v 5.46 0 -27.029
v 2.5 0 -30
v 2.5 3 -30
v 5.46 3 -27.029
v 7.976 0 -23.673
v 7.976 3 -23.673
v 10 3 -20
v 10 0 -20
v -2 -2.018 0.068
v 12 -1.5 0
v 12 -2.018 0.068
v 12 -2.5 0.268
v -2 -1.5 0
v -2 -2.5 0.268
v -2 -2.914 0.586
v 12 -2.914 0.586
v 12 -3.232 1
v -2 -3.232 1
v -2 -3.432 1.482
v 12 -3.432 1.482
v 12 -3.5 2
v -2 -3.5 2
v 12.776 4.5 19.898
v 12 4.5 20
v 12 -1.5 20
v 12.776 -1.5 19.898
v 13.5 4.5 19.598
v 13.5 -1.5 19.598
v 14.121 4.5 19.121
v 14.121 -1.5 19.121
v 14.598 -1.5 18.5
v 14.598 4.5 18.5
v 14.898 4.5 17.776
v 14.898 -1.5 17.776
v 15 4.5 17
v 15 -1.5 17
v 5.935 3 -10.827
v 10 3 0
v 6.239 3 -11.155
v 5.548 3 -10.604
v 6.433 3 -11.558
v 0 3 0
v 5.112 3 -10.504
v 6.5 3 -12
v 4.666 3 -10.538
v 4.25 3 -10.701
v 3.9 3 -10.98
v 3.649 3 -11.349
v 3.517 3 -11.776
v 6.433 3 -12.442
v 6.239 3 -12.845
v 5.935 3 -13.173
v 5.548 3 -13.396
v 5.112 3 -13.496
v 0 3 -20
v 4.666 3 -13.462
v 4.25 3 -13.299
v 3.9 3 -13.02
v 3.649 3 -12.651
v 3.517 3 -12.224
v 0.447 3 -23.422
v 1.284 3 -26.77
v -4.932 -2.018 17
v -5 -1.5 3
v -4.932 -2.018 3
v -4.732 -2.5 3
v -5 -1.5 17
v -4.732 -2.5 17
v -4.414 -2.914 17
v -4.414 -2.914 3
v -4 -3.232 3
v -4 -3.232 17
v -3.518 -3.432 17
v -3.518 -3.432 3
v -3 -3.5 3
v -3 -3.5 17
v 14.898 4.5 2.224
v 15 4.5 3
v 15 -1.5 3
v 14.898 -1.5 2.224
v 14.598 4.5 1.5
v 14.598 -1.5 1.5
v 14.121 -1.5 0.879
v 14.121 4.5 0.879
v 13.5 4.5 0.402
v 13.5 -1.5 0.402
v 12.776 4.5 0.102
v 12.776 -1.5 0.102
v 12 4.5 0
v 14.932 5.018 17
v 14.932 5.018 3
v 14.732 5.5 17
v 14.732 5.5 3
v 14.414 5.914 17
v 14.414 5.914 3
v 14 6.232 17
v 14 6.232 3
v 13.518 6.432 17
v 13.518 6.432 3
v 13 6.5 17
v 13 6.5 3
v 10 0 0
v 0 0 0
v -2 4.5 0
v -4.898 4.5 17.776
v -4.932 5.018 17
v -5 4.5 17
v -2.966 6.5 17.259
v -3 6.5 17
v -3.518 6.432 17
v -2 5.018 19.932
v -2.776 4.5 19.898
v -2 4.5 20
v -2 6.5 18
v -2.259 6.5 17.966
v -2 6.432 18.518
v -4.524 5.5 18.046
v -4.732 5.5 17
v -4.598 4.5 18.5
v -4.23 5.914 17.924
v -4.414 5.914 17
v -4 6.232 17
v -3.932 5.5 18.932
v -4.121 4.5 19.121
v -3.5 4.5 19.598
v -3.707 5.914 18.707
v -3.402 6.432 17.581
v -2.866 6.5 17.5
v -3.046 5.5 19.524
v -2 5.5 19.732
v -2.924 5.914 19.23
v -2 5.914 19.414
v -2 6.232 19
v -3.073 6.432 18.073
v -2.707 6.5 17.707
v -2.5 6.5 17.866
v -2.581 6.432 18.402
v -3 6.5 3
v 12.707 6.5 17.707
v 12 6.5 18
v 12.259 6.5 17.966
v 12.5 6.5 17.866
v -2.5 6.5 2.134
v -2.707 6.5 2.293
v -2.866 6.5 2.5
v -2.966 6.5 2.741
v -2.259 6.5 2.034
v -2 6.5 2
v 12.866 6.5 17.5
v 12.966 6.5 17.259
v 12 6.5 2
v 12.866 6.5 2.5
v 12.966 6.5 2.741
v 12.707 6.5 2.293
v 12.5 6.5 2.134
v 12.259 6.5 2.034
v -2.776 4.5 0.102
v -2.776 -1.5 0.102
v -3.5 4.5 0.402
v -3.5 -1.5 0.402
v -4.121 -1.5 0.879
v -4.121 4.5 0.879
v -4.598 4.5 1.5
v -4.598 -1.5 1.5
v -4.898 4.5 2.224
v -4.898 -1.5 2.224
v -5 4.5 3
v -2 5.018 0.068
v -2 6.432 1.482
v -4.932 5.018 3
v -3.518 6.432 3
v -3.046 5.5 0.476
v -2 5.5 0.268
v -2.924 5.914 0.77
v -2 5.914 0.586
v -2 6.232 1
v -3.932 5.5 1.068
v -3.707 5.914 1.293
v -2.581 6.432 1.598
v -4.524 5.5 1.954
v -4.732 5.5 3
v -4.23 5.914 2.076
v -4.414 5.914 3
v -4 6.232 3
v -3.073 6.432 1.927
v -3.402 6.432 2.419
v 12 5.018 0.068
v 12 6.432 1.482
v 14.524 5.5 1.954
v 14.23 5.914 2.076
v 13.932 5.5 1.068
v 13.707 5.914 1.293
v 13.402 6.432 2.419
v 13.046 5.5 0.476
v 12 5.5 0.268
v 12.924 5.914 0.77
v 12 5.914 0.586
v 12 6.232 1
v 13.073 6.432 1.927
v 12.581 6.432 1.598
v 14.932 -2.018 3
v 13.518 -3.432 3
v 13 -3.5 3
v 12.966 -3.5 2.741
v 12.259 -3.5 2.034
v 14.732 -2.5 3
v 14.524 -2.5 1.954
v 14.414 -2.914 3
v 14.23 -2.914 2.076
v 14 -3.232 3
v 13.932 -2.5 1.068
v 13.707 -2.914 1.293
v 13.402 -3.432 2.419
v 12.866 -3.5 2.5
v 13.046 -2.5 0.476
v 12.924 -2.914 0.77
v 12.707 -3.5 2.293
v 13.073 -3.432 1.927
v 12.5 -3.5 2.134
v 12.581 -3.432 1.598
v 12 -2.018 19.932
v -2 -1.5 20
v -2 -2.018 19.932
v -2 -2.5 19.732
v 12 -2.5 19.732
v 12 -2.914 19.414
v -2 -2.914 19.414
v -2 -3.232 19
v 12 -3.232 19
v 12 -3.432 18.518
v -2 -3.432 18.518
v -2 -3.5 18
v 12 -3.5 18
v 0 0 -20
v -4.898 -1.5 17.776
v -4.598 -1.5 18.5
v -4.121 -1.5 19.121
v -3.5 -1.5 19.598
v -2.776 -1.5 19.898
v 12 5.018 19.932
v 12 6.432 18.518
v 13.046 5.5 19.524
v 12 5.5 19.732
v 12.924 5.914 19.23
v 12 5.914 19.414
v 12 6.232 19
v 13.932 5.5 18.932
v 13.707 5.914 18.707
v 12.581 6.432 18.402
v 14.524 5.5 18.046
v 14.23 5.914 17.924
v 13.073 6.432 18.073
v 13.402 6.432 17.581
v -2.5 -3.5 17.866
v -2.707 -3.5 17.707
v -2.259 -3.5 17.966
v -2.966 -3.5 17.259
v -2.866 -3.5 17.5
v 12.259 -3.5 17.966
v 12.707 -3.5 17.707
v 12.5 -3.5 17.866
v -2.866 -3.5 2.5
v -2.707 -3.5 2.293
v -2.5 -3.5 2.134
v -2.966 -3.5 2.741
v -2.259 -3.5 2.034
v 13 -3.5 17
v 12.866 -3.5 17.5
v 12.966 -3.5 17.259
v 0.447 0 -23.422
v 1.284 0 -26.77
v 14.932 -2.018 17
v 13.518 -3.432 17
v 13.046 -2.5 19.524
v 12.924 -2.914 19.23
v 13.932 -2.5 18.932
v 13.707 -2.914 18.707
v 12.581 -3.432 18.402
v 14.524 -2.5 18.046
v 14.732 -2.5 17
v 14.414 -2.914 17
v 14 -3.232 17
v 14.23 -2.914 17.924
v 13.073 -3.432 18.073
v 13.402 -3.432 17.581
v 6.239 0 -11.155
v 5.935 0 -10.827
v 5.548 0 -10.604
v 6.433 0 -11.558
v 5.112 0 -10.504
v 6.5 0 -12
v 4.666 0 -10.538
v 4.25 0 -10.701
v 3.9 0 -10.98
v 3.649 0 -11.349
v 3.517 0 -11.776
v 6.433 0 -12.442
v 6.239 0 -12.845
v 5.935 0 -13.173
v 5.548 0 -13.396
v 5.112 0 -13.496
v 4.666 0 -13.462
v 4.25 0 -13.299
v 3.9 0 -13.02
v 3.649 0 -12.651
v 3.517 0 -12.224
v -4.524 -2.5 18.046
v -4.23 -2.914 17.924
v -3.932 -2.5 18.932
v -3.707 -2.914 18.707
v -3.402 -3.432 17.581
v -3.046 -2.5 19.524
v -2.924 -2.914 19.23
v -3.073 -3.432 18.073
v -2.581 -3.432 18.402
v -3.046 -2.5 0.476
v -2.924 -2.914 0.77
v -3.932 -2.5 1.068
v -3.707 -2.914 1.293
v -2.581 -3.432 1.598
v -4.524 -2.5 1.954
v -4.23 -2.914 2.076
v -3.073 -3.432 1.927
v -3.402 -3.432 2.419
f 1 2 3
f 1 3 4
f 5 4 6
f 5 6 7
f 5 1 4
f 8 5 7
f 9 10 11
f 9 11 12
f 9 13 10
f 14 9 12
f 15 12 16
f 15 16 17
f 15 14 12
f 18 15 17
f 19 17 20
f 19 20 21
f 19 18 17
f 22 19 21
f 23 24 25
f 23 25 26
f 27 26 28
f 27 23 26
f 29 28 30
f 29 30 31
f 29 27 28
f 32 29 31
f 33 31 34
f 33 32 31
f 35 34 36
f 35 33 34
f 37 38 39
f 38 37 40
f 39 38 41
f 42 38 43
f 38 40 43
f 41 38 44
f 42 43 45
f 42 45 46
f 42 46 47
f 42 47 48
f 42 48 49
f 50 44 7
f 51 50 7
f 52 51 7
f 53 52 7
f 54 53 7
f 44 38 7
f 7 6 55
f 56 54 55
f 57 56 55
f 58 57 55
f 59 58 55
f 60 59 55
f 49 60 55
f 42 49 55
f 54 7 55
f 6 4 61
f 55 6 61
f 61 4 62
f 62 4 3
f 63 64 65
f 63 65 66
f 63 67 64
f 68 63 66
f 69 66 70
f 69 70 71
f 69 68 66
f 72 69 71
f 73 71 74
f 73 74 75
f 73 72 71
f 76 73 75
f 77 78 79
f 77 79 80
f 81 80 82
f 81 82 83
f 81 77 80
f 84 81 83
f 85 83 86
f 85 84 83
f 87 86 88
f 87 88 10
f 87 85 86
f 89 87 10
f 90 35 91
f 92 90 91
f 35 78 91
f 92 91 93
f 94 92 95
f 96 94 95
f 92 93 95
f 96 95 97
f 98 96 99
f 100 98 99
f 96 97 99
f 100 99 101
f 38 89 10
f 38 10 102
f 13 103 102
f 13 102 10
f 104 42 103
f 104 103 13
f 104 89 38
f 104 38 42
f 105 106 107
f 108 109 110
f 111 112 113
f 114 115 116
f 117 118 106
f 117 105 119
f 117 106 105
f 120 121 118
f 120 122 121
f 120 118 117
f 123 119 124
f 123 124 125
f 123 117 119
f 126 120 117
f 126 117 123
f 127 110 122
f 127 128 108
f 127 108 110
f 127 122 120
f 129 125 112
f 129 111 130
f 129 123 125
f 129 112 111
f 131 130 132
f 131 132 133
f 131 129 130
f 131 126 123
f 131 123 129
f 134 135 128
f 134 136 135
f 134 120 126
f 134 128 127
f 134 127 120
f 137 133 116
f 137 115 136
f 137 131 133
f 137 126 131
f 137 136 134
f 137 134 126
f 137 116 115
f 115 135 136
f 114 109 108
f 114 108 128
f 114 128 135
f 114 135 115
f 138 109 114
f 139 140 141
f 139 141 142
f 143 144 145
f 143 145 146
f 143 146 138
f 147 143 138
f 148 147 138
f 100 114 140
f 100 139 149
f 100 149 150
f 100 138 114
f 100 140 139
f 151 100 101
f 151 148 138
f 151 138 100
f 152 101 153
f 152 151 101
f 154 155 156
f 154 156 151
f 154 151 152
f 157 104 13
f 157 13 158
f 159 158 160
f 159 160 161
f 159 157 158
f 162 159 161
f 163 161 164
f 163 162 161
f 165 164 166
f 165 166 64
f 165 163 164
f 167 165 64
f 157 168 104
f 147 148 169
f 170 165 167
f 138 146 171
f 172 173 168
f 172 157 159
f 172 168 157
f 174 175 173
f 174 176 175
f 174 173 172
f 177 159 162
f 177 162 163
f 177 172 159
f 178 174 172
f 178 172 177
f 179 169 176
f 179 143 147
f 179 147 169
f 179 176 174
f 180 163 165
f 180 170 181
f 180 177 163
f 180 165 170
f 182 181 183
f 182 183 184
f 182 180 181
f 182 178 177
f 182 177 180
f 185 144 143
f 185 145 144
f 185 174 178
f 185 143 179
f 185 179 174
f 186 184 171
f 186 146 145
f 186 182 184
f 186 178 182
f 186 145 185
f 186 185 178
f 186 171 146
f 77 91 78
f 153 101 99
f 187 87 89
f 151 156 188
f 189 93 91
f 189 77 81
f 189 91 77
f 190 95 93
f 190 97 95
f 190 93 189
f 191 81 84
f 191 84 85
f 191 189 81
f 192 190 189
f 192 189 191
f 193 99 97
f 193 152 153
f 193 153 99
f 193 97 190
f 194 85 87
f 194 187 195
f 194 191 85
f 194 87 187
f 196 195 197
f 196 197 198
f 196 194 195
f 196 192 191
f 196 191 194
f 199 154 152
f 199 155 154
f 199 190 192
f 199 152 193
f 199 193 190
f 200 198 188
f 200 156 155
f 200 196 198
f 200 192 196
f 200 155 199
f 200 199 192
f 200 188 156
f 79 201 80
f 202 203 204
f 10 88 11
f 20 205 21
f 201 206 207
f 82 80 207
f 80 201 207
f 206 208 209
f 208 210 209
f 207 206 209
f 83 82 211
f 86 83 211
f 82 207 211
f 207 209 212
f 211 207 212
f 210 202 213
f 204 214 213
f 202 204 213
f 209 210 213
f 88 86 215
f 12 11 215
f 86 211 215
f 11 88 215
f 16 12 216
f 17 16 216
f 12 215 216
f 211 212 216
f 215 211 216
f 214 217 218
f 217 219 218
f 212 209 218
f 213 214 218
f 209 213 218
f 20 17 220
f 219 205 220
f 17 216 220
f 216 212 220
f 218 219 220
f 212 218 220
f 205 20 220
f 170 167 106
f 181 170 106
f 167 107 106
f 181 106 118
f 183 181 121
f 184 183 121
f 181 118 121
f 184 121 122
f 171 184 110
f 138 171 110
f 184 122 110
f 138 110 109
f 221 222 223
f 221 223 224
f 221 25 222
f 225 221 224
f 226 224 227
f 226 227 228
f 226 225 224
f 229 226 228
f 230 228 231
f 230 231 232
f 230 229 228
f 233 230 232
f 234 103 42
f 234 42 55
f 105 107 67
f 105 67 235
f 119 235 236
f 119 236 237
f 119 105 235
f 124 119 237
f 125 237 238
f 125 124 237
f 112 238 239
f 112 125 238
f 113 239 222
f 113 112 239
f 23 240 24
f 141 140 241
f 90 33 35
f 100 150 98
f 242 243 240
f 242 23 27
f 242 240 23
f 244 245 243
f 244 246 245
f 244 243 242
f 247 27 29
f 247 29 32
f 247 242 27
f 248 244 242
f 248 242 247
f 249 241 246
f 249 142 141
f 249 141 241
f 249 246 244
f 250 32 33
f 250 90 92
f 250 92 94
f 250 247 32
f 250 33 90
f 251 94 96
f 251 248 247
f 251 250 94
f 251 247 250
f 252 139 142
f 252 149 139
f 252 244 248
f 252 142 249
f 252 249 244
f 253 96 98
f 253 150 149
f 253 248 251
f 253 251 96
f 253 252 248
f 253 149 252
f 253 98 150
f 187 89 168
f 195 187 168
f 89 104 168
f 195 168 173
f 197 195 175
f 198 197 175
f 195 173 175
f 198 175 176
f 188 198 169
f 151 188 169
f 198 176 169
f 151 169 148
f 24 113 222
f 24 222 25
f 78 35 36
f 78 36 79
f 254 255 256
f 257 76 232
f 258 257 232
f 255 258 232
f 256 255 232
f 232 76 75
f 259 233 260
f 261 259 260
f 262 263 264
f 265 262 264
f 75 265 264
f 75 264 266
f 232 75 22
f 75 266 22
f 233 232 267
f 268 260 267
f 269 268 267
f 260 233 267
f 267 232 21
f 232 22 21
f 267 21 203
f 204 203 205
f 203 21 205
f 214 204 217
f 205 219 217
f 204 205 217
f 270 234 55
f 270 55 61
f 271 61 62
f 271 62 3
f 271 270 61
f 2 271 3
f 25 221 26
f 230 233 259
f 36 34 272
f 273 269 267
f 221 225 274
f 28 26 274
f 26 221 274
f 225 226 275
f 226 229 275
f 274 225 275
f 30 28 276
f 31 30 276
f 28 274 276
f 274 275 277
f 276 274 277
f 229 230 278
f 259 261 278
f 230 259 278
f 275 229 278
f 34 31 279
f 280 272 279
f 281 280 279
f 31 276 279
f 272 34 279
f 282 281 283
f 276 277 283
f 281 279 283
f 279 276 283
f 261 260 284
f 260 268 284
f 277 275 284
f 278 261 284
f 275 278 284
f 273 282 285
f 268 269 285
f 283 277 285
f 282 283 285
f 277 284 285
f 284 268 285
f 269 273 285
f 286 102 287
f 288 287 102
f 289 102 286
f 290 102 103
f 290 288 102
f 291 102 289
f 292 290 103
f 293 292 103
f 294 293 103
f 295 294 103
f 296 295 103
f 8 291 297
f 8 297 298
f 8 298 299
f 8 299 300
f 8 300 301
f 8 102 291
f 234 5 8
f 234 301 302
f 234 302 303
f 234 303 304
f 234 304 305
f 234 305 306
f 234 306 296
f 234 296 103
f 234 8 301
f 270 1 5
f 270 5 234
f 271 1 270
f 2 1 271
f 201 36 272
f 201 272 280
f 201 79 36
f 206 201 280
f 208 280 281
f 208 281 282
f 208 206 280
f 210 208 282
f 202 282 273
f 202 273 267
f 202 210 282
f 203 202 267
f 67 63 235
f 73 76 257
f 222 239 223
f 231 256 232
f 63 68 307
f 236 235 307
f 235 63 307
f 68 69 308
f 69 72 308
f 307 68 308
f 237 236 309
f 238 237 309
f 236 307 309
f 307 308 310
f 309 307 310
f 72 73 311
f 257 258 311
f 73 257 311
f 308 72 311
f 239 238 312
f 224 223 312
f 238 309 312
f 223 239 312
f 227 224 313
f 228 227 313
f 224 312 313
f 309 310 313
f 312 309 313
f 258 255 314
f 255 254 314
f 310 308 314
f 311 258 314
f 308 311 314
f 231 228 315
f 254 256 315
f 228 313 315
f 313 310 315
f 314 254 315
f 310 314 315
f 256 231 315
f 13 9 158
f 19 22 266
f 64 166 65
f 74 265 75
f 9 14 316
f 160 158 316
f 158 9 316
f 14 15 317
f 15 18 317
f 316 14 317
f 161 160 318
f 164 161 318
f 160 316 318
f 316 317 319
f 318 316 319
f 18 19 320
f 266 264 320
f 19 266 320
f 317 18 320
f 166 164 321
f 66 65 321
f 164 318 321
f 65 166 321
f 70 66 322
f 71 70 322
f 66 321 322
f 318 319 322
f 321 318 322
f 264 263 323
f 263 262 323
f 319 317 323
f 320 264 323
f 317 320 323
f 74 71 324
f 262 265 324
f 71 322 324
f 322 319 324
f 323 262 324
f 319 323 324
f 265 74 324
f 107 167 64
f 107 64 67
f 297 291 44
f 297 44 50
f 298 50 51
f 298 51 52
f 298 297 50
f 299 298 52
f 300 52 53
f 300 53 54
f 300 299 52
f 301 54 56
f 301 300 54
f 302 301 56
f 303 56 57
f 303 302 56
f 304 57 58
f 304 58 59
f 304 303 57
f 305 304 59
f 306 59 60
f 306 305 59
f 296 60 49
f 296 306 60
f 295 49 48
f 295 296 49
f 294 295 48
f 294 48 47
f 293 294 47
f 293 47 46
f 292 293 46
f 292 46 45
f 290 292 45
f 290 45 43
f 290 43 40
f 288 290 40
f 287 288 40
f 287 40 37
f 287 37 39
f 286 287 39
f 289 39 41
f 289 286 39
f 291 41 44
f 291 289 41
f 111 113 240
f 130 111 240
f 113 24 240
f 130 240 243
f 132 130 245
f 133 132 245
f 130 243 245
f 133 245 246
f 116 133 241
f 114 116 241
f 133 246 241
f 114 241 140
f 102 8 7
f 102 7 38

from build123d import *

# Parameters (mm, degrees)
SKETCH1_R           = 1.5
BOSS_EXTRUDE1_DEPTH = 3
BOSS_EXTRUDE2_DEPTH = 5
FILLET1_R           = 2


with BuildPart() as part:
    # Sketch1 → Boss-Extrude1 (new body)
    with BuildSketch(Plane(origin=(0, 0, 0), x_dir=(1, 0, 0), z_dir=(0, 1, 0))):
        with BuildLine():
            Line((0, 0), (0, 20))
            ThreePointArc((0, 20), (0.817293204, 25.108176699), (2.5, 30))
            ThreePointArc((2.5, 30), (6.776610811, 25.394958109), (10, 20))
            Line((10, 20), (10, 0))
            Line((10, 0), (12, 0))
            ThreePointArc((12, 0), (14.121320344, -0.878679656), (15, -3))
            Line((15, -3), (15, -17))
            ThreePointArc((15, -17), (14.121320344, -19.121320344), (12, -20))
            Line((12, -20), (-2, -20))
            ThreePointArc((-2, -20), (-4.121320344, -19.121320344), (-5, -17))
            Line((-5, -17), (-5, -3))
            ThreePointArc((-5, -3), (-4.121320344, -0.878679656), (-2, 0))
            Line((-2, 0), (0, 0))
        make_face()
        with Locations((5, 12)):
            Circle(SKETCH1_R, mode=Mode.SUBTRACT)
    extrude(amount=BOSS_EXTRUDE1_DEPTH)

    # Sketch2 → Boss-Extrude2 (add, symmetric)
    with BuildSketch(Plane(origin=(0, 1.5, 0), x_dir=(1, 0, 0), z_dir=(0, 1, 0))):
        with BuildLine():
            Line((0, 0), (-2, 0))
            ThreePointArc((-2, 0), (-4.121320344, -0.878679656), (-5, -3))
            Line((-5, -3), (-5, -17))
            ThreePointArc((-5, -17), (-4.121320344, -19.121320344), (-2, -20))
            Line((-2, -20), (12, -20))
            ThreePointArc((12, -20), (14.121320344, -19.121320344), (15, -17))
            Line((15, -17), (15, -3))
            ThreePointArc((15, -3), (14.121320344, -0.878679656), (12, 0))
            Line((12, 0), (10, 0))
            Line((10, 0), (0, 0))
        make_face()
    extrude(amount=BOSS_EXTRUDE2_DEPTH, both=True)

    # Fillet1
    fillet1_edges = [part.edges().sort_by_distance(p)[0] for p in [
        (-4.121320344, -3.5, 0.878679656),
        (-5, -3.5, 10),
        (-4.121320344, -3.5, 19.121320344),
        (5, -3.5, 20),
        (14.121320344, -3.5, 19.121320344),
        (15, -3.5, 10),
        (14.121320344, -3.5, 0.878679656),
        (5, -3.5, 0),
        (5, 6.5, 0),
        (-4.121320344, 6.5, 0.878679656),
        (-5, 6.5, 10),
        (-4.121320344, 6.5, 19.121320344),
        (5, 6.5, 20),
        (14.121320344, 6.5, 19.121320344),
        (15, 6.5, 10),
        (14.121320344, 6.5, 0.878679656),
    ]]
    fillet(fillet1_edges, radius=FILLET1_R)


solid = part.part
